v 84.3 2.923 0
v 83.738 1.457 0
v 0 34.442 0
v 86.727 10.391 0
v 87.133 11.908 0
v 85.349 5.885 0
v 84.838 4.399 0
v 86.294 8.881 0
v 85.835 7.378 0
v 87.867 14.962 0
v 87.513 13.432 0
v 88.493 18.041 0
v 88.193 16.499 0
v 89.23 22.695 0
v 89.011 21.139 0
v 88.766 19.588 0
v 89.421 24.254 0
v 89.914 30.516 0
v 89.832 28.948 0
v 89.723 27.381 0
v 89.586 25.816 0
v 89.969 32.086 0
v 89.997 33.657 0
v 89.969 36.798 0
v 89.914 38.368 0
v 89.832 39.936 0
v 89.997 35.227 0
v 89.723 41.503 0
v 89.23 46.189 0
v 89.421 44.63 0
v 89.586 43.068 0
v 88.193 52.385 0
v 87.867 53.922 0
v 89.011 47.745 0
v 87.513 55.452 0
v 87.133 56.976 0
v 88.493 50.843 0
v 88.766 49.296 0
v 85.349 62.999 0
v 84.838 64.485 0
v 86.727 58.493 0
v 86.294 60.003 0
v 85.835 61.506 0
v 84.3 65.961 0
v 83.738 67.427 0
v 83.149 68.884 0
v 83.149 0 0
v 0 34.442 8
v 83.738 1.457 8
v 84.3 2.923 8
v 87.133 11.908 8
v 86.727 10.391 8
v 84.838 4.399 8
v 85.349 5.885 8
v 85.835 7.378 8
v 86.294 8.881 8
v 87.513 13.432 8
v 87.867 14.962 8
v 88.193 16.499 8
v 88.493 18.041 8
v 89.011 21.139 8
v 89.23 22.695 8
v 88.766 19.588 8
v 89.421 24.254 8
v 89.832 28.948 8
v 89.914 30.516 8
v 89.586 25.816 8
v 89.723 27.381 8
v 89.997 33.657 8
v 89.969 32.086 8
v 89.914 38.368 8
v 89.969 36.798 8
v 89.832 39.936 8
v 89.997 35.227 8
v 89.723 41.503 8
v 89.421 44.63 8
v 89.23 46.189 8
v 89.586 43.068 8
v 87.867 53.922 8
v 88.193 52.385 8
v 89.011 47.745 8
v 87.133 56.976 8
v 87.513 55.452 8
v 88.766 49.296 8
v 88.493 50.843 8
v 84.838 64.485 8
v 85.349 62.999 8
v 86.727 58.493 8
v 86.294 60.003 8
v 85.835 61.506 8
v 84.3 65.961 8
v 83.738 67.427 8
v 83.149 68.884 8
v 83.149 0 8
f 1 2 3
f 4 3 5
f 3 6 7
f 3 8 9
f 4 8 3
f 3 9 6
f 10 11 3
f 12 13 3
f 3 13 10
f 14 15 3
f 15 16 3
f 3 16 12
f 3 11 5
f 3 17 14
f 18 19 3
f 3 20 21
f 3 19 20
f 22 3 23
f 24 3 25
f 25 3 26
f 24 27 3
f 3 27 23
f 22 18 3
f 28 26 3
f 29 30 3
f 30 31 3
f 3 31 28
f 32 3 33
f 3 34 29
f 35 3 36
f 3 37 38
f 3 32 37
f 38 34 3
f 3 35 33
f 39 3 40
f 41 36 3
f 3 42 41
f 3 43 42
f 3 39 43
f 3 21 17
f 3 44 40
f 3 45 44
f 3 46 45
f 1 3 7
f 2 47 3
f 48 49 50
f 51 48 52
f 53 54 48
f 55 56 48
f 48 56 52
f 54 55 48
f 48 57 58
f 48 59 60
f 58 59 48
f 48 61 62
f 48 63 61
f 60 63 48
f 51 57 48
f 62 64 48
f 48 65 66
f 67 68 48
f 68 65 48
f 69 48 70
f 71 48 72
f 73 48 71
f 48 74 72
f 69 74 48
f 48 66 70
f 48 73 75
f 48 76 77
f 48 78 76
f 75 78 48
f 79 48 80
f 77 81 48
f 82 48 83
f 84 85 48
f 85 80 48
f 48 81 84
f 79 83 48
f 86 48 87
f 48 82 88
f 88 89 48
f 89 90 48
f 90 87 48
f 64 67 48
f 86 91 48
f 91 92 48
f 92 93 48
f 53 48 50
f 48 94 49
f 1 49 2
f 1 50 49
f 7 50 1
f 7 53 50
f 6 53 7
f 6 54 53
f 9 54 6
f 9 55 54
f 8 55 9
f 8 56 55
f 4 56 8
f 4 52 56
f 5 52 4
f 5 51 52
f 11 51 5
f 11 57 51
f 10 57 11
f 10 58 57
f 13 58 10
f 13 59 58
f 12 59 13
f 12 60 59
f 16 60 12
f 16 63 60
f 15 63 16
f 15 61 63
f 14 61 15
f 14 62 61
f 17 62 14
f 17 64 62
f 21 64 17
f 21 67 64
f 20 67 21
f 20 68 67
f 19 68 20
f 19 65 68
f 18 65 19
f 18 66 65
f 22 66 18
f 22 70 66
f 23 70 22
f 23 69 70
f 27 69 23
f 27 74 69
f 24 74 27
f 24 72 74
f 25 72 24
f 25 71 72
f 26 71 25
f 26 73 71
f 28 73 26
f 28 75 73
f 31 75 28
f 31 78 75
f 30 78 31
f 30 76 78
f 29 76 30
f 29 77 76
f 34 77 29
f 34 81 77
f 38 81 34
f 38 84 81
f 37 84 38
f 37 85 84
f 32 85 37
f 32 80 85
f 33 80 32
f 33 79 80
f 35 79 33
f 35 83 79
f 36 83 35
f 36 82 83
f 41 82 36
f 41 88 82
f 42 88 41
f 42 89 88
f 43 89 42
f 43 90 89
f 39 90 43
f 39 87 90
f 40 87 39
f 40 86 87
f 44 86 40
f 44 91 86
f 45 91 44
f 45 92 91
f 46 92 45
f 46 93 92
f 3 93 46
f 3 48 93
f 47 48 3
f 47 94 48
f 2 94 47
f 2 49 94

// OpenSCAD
$fn = 32;

// ----------------------------------------------------------------------
// Arc profile plate: sector, 47 points
// ----------------------------------------------------------------------

// --- parameters (mm) ---
sector_angle = 45;        // sector angle, degrees
sector_r = 90;            // outer radius
arc_step = 1;             // sampling step of the arc, degrees
plate_t = 8;              // plate thickness, Z

bbox_x = 2 * sector_r * sin(sector_angle / 2);  // chord of the sector
bbox_y = sector_r;  // depth of the sector (apex to arc)

profile = [[83.149, 0], [83.738, 1.457], [84.3, 2.923], [84.838, 4.399], [85.349, 5.885], [85.835, 7.378], [86.294, 8.881], [86.727, 10.391], [87.133, 11.908], [87.513, 13.432], [87.867, 14.962], [88.193, 16.499], [88.493, 18.041], [88.766, 19.588], [89.011, 21.139], [89.23, 22.695], [89.421, 24.254], [89.586, 25.816], [89.723, 27.381], [89.832, 28.948], [89.914, 30.516], [89.969, 32.086], [89.997, 33.657], [89.997, 35.227], [89.969, 36.798], [89.914, 38.368], [89.832, 39.936], [89.723, 41.503], [89.586, 43.068], [89.421, 44.63], [89.23, 46.189], [89.011, 47.745], [88.766, 49.296], [88.493, 50.843], [88.193, 52.385], [87.867, 53.922], [87.513, 55.452], [87.133, 56.976], [86.727, 58.493], [86.294, 60.003], [85.835, 61.506], [85.349, 62.999], [84.838, 64.485], [84.3, 65.961], [83.738, 67.427], [83.149, 68.884], [0, 34.442]];  // primary outline, 47 points, counter clockwise

// --- the one profile operation ---
linear_extrude(height = plate_t) polygon(points = profile);
